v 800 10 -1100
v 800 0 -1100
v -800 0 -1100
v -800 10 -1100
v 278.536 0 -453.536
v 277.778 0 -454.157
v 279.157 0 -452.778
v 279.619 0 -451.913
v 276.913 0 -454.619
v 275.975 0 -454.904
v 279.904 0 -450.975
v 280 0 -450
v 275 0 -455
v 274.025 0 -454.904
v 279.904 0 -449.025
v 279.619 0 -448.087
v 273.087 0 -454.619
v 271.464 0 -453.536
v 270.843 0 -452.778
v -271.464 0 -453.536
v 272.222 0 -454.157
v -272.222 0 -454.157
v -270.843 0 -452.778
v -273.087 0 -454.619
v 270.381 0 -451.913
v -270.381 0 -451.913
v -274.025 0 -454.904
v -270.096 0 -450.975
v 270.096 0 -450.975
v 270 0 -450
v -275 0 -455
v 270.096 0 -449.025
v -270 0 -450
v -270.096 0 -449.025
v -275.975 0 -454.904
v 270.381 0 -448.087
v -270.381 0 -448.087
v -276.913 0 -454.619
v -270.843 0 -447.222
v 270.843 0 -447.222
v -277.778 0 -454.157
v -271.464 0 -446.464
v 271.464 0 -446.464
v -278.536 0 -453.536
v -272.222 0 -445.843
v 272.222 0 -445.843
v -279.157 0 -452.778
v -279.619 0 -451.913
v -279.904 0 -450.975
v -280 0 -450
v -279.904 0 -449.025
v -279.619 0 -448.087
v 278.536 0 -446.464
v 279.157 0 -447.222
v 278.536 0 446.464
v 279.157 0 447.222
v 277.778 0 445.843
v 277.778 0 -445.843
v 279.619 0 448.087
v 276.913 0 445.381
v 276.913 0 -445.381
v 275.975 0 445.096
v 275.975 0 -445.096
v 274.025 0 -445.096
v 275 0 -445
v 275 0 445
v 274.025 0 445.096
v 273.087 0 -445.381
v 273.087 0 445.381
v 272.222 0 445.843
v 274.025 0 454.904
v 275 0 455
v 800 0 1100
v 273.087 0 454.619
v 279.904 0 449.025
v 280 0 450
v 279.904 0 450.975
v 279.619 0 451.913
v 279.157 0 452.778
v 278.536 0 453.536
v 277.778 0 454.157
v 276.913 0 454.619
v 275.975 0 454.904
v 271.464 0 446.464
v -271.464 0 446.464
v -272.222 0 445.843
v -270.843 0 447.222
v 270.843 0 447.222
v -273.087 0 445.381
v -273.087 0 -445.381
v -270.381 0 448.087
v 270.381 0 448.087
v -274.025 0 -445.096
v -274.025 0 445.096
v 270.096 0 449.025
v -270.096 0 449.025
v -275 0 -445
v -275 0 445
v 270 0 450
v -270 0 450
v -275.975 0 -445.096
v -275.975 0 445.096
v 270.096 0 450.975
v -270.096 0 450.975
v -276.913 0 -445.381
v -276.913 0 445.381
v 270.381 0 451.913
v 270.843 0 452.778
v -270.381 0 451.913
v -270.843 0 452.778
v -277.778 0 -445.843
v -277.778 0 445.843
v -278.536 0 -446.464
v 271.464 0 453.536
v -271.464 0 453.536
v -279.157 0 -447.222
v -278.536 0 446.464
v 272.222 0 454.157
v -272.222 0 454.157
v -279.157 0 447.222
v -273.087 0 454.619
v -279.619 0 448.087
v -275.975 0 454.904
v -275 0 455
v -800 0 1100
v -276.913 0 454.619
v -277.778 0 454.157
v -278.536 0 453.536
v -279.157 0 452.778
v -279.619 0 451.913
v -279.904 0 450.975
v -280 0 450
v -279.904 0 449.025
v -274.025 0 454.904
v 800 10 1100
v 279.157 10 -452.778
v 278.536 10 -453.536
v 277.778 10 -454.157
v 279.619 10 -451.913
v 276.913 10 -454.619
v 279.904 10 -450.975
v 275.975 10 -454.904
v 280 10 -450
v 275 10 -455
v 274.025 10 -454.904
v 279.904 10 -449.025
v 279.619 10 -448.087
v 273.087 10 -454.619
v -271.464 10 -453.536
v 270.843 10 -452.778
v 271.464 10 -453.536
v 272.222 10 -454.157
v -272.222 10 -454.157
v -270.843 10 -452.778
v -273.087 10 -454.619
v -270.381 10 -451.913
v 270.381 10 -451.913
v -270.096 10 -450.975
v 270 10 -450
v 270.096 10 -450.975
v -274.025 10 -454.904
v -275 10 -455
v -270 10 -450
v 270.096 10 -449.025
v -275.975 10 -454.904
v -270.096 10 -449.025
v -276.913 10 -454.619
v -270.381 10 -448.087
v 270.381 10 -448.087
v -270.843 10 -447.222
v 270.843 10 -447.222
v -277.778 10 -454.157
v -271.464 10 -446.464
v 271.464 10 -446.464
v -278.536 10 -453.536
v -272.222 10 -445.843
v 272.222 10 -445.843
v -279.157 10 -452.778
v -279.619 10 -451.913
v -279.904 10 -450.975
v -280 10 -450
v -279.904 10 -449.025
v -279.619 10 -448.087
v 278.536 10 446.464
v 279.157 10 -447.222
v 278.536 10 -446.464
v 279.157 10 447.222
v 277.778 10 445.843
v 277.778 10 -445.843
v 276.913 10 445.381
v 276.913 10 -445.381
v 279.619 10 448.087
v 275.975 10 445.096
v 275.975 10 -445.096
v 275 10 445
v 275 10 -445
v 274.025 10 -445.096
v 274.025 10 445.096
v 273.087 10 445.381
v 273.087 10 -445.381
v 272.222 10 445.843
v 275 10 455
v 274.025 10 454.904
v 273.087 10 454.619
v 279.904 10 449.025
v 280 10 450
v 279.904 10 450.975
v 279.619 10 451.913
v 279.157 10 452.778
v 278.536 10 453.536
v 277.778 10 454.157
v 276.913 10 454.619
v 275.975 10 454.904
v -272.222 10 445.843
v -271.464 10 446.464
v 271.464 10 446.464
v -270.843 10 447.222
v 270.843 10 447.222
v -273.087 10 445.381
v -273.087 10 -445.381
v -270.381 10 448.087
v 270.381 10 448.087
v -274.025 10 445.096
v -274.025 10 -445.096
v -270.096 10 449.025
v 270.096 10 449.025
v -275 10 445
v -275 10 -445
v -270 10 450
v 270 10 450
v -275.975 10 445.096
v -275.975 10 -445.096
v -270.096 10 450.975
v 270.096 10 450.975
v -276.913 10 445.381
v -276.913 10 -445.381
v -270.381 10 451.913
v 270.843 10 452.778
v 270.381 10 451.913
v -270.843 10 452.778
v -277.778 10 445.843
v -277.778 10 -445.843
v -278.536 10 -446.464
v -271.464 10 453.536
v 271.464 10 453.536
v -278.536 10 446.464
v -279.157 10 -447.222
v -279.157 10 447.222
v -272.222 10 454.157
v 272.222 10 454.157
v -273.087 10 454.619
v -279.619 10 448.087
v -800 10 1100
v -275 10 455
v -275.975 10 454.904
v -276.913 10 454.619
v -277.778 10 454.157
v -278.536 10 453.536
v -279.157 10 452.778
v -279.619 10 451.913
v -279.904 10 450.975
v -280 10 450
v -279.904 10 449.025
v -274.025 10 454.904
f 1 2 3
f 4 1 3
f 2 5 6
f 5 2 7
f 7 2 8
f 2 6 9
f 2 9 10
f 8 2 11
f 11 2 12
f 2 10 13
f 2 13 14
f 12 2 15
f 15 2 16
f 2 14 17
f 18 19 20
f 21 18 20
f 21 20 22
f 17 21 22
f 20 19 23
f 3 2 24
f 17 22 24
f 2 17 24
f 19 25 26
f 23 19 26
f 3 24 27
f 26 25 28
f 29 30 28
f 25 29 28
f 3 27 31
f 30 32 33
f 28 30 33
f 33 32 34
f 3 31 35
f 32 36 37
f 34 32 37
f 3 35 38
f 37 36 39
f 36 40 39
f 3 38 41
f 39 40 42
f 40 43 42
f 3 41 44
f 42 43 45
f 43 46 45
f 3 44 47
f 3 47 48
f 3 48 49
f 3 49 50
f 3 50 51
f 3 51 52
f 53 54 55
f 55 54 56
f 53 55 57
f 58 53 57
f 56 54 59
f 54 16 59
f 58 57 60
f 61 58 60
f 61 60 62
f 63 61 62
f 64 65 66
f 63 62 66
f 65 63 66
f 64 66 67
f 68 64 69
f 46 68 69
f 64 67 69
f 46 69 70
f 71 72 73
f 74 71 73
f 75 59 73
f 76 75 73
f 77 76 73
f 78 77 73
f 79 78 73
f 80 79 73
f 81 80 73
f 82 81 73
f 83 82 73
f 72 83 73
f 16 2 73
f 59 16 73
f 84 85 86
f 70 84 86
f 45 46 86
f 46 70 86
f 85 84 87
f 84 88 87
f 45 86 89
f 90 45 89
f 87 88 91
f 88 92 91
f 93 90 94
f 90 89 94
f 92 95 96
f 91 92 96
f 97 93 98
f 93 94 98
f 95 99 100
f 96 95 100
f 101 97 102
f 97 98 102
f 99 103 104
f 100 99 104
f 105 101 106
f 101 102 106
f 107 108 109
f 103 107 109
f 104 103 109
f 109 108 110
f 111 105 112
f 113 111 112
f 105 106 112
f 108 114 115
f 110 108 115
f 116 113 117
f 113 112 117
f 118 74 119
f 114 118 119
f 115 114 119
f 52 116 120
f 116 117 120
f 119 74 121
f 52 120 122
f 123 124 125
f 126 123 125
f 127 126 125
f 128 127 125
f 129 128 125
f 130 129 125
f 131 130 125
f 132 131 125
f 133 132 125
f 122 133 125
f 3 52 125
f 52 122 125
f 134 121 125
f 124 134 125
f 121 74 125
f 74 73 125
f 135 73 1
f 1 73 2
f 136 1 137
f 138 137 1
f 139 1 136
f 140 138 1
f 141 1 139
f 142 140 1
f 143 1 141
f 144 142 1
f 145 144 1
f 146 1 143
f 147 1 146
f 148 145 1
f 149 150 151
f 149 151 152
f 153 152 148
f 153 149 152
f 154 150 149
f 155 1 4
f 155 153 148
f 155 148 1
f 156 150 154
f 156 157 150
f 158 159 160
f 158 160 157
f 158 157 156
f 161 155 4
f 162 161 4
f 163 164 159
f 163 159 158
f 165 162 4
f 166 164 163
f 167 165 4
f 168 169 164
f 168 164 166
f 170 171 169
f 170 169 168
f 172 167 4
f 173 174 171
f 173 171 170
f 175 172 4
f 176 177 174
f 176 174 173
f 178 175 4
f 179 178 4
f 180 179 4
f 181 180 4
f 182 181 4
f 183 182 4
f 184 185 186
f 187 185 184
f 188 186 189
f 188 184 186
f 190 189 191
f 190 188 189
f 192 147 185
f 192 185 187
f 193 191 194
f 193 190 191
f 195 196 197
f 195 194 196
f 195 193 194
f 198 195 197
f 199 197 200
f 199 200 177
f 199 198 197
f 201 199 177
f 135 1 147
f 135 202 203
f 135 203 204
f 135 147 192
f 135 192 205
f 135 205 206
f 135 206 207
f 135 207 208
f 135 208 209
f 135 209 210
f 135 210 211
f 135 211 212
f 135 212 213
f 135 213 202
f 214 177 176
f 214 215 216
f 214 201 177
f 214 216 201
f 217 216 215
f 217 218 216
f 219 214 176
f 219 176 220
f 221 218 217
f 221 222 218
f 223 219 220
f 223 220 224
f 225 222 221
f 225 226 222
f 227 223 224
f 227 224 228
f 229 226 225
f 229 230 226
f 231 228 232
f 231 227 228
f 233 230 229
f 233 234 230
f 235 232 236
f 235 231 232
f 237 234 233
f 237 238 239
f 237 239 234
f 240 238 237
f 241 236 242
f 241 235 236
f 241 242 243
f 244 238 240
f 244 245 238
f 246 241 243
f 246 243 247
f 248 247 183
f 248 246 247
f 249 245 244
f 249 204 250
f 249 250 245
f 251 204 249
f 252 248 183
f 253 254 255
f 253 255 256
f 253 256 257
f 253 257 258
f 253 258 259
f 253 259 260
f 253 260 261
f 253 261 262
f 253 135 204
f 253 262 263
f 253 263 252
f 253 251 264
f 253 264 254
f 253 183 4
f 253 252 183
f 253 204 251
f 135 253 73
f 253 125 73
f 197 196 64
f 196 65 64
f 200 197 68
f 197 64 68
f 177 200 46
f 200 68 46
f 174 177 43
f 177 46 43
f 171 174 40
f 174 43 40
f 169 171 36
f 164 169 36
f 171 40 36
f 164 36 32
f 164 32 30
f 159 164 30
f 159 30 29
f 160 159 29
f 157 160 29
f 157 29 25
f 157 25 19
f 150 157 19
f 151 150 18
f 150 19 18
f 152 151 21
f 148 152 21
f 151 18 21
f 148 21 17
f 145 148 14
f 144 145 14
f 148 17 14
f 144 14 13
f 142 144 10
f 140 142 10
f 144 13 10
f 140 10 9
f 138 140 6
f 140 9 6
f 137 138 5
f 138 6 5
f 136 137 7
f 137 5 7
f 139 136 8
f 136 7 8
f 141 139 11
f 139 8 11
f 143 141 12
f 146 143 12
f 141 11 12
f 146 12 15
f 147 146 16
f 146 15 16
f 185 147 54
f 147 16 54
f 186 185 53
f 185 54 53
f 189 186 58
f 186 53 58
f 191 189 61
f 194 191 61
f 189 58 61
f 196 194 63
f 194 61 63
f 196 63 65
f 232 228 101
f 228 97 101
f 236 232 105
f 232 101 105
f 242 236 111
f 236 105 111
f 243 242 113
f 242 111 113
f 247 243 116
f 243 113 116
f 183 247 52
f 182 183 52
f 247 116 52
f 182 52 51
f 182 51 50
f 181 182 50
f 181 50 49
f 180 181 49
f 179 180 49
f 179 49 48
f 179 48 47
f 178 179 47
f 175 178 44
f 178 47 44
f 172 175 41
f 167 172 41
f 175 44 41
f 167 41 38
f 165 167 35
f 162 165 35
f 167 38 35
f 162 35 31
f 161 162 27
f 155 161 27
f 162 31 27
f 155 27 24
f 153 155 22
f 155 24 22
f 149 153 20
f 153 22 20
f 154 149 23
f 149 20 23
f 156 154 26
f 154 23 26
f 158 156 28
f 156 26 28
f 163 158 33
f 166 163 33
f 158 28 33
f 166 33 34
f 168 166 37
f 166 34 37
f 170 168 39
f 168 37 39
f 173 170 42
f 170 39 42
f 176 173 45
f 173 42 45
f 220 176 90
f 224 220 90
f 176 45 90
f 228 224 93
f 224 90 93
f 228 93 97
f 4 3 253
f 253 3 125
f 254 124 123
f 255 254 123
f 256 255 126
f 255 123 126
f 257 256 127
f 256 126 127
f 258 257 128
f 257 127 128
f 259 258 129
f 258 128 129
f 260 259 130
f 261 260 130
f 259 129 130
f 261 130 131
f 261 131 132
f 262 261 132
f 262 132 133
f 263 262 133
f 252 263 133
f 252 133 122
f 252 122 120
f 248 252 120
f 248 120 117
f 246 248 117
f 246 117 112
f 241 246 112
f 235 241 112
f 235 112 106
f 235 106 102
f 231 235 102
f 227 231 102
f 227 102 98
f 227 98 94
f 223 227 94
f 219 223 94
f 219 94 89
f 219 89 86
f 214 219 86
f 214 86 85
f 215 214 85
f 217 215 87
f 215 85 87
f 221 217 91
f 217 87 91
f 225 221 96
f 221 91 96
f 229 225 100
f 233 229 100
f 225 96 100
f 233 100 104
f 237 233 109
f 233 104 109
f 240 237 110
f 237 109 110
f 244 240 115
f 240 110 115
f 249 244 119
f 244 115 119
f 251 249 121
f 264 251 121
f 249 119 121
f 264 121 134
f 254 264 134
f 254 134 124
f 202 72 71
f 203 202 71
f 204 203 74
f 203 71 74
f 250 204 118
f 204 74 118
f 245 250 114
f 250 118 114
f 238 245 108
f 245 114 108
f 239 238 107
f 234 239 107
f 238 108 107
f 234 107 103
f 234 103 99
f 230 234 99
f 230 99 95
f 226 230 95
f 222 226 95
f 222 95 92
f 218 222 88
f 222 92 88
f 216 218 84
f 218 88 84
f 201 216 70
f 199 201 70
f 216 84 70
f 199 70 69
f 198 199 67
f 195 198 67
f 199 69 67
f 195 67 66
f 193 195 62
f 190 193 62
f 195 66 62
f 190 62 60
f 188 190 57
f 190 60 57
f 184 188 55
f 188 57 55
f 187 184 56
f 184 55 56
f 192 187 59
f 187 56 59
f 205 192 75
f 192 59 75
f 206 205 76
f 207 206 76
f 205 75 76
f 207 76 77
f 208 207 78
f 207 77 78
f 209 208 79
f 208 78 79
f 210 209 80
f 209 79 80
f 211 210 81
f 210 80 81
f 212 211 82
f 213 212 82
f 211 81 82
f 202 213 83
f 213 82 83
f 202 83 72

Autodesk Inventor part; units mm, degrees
ref_plane "YZ Plane" through (0, 0, 0) normal (1, 0, 0) x (0, 1, 0)
ref_plane "XZ Plane" through (0, 0, 0) normal (0, 1, 0) x (-1, 0, 0)
ref_plane "XY Plane" through (0, 0, 0) normal (0, 0, 1) x (1, 0, 0)
sketch "Sketch1" plane through (0, 0, 0) normal (0, 1, 0) x (-1, 0, 0)
  line L0 (800, 1100) -> (-800, 1100)
  line L1 (-800, 1100) -> (-800, -1100)
  line L2 (-800, -1100) -> (800, -1100)
  line L3 (800, -1100) -> (800, 1100)
  point P0 (0, 0)
  dimension "d0" = 1100
  dimension "d1" = 2200
  dimension "d2" = 1600
  dimension "d3" = 800
extrude "base" add sketch "Sketch1" along normal blind 10
sketch "Sketch2" plane through (0, 10, 0) normal (0, 1, 0) x (1, 0, 0)
  point P0 (0, 0)
  point P1 (-275, -450)
  point P2 (275, -450)
  point P3 (-275, 450)
  point P4 (275, 450)
  dimension "d10" = 900
  dimension "d11" = 900
  dimension "d12" = 550
  dimension "d13" = 550
  dimension "d14" = 275
  dimension "d15" = 275
  dimension "d16" = 450
  dimension "d17" = 450
hole "mountHoles" at (-275, 10, 450) at (275, 10, 450) at (-275, 10, -450) at (275, 10, -450) direction (0, -1, 0) diameter 10 end through all
equation "\"d0\" = 0.5 * d1"
equation "\"d1\" = cover_length_main"
equation "\"d2\" = cover_width_main"
equation "\"d3\" = 0.5 * d2"
equation "\"d4\" = cover_base_thickness"
equation "\"d10\" = cover_mountHole_xSpacing"
equation "\"d11\" = cover_mountHole_xSpacing"
equation "\"d12\" = cover_mountHole_ySpacing"
equation "\"d13\" = cover_mountHole_ySpacing"
equation "\"d14\" = 0.5 * d12"
equation "\"d15\" = 0.5 * d13"
equation "\"d16\" = 0.5 * d10"
equation "\"d17\" = 0.5 * d11"
equation "\"d18\" = cover_mountHole_diameter"
equation "\"cover_width_main\" = 1600"
equation "\"cover_length_main\" = 2200"
equation "\"cover_base_thickness\" = 10"
equation "\"cover_mountHole_diameter\" = 10"
equation "\"cover_mountHole_xSpacing\" = 900"
equation "\"cover_mountHole_ySpacing\" = 550"
equation "\"hoop_angle_z\" = 45deg"
equation "\"hoop_bearing_length\" = 5deg"
equation "\"hoop_cable_diam\" = 5"
equation "\"hoop_cable_pulley_diam\" = 22"
equation "\"rack_tooth_addendum\" = 5"
equation "\"rack_tooth_dedendum\" = 5"
equation "\"rack_tooth_thickness\" = 5"
equation "\"secure_arm_angle\" = 20deg"
equation "\"secure_arm_hold_length\" = 35"
equation "\"secure_arm_radii\" = 9"
equation "\"support_baseClamp_platformLengthBuffer\" = 35"
equation "\"support_baseClamp_platformThickness\" = 15"
equation "\"support_baseClamp_platformWidthBuffer\" = 0"
equation "\"support_baseClamp_sleeveHoleDiameter\" = 12"
equation "\"support_baseClamp_sleeveSweepTerminationAngle\" = 55deg"
equation "\"support_baseClamp_thickness\" = 8"
equation "\"support_frame_endHoleBuffer\" = 25"
equation "\"support_frame_squareBarFillet\" = 2"
equation "\"support_frame_squareBarThickness\" = 5"
equation "\"hoop_tabs_hole\" = 4"
equation "\"hoop_tabs_thickness\" = 6"
equation "\"wheelchair_deployed_width\" = 635"
equation "\"wheelchair_deployed_height\" = 914"
equation "\"wheelchair_deployed_length\" = 1067"
properties part number "cover_base"
